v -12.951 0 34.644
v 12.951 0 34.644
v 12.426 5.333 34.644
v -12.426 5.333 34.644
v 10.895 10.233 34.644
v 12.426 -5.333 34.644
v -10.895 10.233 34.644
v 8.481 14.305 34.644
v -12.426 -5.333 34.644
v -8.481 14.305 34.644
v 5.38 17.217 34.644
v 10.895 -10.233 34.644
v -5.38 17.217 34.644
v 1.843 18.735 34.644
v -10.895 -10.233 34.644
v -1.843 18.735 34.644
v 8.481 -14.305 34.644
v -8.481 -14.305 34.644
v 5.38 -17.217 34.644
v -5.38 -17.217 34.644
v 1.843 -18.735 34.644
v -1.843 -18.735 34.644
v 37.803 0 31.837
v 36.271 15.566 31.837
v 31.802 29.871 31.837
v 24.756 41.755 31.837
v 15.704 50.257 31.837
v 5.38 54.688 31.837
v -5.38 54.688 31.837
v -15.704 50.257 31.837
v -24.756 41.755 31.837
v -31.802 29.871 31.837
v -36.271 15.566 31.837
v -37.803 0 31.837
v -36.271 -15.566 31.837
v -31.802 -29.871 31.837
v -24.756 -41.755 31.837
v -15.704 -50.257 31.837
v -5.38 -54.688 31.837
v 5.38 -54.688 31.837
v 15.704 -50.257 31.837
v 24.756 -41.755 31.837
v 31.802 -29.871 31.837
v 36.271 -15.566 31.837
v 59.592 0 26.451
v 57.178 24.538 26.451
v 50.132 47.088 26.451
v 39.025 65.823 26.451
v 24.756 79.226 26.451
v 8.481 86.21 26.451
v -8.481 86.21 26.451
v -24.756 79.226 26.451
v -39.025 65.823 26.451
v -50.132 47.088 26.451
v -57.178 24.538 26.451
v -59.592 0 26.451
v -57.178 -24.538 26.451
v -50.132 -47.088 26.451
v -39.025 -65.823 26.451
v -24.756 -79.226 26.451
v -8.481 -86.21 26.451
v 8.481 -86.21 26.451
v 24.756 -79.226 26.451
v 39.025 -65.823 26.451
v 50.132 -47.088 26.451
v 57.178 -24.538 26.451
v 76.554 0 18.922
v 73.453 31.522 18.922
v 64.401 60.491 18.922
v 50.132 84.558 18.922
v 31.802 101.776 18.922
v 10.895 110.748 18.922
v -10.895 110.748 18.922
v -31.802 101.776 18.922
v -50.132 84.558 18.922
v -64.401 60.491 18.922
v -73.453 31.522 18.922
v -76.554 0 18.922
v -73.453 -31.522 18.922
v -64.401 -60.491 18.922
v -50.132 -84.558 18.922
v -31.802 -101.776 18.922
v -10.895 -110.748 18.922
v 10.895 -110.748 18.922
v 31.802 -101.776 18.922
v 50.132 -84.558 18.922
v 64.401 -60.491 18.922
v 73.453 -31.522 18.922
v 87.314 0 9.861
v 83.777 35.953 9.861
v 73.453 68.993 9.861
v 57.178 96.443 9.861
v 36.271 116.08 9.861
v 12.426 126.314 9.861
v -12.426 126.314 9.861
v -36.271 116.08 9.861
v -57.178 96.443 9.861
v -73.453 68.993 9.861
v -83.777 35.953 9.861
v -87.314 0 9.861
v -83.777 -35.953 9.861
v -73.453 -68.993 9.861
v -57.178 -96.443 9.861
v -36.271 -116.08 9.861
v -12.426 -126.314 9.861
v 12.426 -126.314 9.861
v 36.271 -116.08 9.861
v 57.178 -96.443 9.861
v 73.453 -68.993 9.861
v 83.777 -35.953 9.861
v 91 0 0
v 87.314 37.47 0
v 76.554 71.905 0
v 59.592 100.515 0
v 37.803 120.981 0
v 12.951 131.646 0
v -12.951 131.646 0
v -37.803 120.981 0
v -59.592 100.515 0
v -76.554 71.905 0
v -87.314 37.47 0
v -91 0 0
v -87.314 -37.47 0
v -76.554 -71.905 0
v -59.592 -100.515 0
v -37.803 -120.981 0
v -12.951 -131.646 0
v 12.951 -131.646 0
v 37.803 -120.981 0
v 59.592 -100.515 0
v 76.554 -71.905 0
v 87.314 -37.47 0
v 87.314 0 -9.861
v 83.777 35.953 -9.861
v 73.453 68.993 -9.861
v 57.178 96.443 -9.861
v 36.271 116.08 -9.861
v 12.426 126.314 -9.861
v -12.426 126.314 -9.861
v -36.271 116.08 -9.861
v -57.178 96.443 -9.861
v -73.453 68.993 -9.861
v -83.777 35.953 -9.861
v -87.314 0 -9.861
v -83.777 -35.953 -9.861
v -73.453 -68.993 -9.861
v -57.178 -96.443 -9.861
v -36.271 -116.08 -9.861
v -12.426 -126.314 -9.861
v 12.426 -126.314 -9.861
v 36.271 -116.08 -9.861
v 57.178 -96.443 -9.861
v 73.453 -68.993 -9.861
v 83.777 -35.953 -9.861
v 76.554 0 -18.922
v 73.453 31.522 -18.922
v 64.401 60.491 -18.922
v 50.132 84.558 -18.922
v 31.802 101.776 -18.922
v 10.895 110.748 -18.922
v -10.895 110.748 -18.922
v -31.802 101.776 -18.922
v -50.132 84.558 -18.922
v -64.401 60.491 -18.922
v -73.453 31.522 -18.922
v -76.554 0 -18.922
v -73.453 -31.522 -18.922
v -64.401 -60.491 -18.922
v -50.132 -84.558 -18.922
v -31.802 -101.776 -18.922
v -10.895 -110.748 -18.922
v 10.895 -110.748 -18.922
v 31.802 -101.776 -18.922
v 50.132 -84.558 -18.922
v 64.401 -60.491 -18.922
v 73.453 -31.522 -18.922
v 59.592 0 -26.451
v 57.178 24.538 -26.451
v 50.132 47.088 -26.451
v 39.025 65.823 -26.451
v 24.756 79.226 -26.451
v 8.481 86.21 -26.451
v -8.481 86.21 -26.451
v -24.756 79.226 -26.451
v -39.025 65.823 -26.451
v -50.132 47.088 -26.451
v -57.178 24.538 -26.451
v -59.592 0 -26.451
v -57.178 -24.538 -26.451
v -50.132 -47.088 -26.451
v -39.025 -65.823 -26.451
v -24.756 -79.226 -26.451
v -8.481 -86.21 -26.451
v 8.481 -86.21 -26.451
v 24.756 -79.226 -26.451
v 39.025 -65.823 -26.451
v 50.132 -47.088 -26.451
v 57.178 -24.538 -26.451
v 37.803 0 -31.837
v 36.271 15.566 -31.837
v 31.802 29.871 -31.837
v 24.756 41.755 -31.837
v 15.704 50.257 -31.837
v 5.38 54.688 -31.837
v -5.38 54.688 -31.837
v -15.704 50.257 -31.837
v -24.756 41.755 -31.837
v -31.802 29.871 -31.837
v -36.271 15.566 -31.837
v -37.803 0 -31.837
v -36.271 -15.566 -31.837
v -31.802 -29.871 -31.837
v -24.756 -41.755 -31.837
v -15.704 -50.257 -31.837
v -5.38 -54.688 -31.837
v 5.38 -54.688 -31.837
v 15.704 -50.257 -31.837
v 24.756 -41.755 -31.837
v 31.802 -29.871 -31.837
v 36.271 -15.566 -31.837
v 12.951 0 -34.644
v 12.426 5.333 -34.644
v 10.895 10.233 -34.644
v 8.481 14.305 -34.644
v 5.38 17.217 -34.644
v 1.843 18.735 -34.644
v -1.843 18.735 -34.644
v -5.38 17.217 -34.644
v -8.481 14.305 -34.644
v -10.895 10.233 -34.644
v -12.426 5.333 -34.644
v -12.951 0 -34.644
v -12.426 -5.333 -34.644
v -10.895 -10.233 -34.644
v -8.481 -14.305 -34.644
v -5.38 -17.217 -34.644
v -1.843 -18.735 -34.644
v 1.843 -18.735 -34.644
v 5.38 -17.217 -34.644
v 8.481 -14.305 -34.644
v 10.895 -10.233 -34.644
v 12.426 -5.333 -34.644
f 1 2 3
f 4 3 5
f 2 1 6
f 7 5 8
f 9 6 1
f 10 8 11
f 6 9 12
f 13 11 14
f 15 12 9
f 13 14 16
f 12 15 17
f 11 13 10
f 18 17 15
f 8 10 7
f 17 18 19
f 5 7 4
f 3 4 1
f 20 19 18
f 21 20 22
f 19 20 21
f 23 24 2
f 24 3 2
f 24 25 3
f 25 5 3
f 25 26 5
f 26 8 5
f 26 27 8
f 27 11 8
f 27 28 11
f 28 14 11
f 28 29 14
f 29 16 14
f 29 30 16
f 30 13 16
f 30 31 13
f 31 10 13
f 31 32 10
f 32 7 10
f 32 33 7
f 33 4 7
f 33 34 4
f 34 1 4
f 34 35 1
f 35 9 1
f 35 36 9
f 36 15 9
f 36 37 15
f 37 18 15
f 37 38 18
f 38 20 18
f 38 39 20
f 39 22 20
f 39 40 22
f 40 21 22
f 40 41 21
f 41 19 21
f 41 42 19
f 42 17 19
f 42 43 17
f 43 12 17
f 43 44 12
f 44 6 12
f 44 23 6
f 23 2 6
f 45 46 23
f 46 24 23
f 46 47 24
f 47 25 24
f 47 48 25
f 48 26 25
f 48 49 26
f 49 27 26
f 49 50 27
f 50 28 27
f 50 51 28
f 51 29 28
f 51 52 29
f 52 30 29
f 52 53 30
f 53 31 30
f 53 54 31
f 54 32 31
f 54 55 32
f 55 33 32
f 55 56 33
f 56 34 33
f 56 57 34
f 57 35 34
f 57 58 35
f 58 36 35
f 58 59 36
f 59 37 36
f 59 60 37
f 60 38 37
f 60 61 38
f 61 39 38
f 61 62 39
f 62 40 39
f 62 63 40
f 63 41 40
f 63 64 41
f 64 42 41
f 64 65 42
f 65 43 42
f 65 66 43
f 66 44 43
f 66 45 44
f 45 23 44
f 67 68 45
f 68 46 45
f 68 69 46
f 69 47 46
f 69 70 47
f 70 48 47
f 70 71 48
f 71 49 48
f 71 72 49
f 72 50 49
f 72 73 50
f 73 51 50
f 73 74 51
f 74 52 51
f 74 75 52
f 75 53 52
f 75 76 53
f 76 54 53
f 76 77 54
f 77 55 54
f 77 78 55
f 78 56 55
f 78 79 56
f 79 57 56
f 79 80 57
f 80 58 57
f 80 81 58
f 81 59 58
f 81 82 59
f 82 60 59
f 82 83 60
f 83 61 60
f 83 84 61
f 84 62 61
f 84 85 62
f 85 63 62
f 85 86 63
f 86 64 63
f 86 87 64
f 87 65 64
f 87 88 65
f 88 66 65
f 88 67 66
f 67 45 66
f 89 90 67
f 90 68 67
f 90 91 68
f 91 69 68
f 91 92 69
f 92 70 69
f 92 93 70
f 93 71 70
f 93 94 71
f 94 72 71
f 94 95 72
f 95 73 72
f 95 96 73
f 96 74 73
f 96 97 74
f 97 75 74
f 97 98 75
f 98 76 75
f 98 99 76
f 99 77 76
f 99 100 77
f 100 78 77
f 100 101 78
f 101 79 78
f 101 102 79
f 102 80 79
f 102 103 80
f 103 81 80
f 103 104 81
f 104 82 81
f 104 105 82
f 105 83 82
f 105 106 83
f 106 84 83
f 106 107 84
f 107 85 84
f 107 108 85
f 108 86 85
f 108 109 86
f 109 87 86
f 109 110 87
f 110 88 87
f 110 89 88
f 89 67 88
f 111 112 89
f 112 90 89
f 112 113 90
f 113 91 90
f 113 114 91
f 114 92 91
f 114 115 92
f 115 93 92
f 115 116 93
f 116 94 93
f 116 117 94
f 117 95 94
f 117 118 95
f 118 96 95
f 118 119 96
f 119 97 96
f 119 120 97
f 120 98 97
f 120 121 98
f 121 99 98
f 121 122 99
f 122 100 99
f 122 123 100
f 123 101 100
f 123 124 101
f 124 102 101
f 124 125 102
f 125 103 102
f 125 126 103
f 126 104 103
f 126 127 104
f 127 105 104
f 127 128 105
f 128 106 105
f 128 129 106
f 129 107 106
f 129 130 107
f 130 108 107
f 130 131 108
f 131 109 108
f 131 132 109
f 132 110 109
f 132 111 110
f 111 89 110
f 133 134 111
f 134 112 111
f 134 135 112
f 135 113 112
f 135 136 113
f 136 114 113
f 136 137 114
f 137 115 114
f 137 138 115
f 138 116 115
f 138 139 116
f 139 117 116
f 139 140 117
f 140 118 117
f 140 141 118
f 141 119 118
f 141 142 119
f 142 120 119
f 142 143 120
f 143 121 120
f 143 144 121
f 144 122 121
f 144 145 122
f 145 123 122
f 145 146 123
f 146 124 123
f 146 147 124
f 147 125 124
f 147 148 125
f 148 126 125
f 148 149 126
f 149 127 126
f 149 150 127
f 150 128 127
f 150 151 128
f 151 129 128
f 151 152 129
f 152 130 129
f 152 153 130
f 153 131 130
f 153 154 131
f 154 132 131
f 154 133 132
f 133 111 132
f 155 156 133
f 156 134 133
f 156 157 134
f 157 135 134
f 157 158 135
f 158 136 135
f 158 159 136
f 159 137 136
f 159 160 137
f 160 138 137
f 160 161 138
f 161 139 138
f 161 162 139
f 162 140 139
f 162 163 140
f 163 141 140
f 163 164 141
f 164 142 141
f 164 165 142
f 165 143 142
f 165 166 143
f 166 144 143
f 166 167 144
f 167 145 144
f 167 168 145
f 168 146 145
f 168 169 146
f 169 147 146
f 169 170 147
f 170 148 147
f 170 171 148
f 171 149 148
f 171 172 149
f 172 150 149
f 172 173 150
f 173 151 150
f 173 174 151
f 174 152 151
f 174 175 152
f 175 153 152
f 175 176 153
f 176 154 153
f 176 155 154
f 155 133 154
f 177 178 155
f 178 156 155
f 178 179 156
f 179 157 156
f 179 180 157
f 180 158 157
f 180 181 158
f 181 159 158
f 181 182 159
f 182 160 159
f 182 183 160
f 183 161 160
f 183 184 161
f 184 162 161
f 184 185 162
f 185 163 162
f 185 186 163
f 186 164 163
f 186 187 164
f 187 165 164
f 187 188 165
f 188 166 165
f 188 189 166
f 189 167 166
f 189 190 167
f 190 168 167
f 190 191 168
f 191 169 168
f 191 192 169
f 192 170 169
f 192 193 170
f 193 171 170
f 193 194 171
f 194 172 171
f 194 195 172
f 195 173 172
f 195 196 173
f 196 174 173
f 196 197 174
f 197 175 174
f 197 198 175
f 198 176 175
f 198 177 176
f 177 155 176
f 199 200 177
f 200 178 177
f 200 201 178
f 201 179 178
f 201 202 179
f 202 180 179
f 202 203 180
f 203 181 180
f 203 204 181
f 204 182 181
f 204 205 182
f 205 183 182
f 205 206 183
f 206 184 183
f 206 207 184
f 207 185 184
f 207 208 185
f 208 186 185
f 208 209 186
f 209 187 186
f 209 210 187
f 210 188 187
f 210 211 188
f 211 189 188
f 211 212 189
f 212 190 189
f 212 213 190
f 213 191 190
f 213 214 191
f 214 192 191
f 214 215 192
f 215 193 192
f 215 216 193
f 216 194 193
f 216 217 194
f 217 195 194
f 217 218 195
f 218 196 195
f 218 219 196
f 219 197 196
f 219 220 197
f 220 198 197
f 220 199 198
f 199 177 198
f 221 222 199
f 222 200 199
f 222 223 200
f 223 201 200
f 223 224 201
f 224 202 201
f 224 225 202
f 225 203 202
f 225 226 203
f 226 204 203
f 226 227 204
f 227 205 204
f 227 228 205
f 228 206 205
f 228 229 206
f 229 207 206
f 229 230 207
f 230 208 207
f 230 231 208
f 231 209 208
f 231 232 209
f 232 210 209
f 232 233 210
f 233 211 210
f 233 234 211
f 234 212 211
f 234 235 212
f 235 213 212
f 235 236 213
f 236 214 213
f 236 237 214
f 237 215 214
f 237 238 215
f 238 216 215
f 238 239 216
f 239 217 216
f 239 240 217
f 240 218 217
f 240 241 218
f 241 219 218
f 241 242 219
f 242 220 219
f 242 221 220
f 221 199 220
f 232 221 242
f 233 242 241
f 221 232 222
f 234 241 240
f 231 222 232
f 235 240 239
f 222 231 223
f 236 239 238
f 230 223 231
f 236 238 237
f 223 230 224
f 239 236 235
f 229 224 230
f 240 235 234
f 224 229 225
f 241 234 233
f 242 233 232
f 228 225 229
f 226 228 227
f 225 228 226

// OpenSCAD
// Generated by SolidPython 1.0.1 on 2020-07-29 00:46:51


scale(v = [13, 19, 5]) {
	sphere(r = 7);
}
/***********************************************
*********      SolidPython code:      **********
************************************************
 
# import packages: SolidPython
from solid import *
from solid.utils import *
from itertools import chain, combinations, permutations


class Resize:

    def __init__(self, scad_file):
        self.scad_file = scad_file
        #self.scad_file = import_scad(scad_file)
        # cone/cylinder param:
        self.r1 = 0
        self.r2 = 0
        self.h = 0
        # rectangular prism param:
        self.w = 0
        self.l = 0
        # ellipse param:
        self.r = 0

    # import OpenScad code (file name corresponds to shape)


    # classify shape + parameters
    def assign(self, param1, param2, param3):
        if self.scad_file == 'cone.scad':
            self.r1 = param1
            self.r2 = param2
            self.h = param3
        elif self.scad_file == 'cylinder.scad':
            self.r1 = param1
            self.r2 = param2
            self.h = param3
        elif self.scad_file == 'rectangularPrism.scad':
            self.h = param1
            self.l = param2
            self.w = param3
        else:
            self.r = param1
            self.h = param2

    # resize parameters
    def iterate(self):
        x = range(3, 20, 2)
        i = 1
        if self.scad_file == 'cone.scad':
            tempList = list(permutations(x, 2))
            for temp in tempList:
                param1 = temp[0]
                param2 = temp[1]
                filepath = 'produced_scad_files/' + 'cone' + str(param1) + '_' + str(param2) + '_' + '.scad'
                scad_render_to_file(cylinder(h=param1, r1=param2, r2=0), filepath)

        elif self.scad_file == 'cylinder.scad':
            tempList = list(permutations(x, 3))
            for temp in tempList:
                param1 = temp[0]
                param2 = temp[1]
                filepath = 'produced_scad_files/' + 'cylinder' + str(param1) + '_' + str(param2) + '_' + '.scad'
                scad_render_to_file(cylinder(h=param1, r1=param2, r2=param2), filepath)

        elif self.scad_file == 'rectangularPrism.scad':
            tempList = list(permutations(x, 3))
            for temp in tempList:
                param1 = temp[0]
                param2 = temp[1]
                param3 = temp[2]
                filepath = 'produced_scad_files/' + 'rectangularPrism' + str(param1) + '_' + str(param2) + '_' + str(
                    param3) + '.scad'
                scad_render_to_file(cube(size=(param1, param2, param3)), filepath)

        elif self.scad_file == 'ellipse.scad':
            tempList = list(permutations(x, 4))
            for temp in tempList:
                param1 = temp[0]
                param2 = temp[1]
                param3 = temp[2]
                param4 = temp[3]
                filepath = 'produced_scad_files/' + 'ellipse' + str(param1) + '_' + str(param2) + '_' + str(param3) + '_' + str(param4) + '.scad'
                scad_render_to_file(scale([param1, param2, param3])(sphere(r=param4)), filepath)

    def render_to_scadfile(self):
        scad_render_to_file(scad, 'example.scad') 
 
************************************************/
